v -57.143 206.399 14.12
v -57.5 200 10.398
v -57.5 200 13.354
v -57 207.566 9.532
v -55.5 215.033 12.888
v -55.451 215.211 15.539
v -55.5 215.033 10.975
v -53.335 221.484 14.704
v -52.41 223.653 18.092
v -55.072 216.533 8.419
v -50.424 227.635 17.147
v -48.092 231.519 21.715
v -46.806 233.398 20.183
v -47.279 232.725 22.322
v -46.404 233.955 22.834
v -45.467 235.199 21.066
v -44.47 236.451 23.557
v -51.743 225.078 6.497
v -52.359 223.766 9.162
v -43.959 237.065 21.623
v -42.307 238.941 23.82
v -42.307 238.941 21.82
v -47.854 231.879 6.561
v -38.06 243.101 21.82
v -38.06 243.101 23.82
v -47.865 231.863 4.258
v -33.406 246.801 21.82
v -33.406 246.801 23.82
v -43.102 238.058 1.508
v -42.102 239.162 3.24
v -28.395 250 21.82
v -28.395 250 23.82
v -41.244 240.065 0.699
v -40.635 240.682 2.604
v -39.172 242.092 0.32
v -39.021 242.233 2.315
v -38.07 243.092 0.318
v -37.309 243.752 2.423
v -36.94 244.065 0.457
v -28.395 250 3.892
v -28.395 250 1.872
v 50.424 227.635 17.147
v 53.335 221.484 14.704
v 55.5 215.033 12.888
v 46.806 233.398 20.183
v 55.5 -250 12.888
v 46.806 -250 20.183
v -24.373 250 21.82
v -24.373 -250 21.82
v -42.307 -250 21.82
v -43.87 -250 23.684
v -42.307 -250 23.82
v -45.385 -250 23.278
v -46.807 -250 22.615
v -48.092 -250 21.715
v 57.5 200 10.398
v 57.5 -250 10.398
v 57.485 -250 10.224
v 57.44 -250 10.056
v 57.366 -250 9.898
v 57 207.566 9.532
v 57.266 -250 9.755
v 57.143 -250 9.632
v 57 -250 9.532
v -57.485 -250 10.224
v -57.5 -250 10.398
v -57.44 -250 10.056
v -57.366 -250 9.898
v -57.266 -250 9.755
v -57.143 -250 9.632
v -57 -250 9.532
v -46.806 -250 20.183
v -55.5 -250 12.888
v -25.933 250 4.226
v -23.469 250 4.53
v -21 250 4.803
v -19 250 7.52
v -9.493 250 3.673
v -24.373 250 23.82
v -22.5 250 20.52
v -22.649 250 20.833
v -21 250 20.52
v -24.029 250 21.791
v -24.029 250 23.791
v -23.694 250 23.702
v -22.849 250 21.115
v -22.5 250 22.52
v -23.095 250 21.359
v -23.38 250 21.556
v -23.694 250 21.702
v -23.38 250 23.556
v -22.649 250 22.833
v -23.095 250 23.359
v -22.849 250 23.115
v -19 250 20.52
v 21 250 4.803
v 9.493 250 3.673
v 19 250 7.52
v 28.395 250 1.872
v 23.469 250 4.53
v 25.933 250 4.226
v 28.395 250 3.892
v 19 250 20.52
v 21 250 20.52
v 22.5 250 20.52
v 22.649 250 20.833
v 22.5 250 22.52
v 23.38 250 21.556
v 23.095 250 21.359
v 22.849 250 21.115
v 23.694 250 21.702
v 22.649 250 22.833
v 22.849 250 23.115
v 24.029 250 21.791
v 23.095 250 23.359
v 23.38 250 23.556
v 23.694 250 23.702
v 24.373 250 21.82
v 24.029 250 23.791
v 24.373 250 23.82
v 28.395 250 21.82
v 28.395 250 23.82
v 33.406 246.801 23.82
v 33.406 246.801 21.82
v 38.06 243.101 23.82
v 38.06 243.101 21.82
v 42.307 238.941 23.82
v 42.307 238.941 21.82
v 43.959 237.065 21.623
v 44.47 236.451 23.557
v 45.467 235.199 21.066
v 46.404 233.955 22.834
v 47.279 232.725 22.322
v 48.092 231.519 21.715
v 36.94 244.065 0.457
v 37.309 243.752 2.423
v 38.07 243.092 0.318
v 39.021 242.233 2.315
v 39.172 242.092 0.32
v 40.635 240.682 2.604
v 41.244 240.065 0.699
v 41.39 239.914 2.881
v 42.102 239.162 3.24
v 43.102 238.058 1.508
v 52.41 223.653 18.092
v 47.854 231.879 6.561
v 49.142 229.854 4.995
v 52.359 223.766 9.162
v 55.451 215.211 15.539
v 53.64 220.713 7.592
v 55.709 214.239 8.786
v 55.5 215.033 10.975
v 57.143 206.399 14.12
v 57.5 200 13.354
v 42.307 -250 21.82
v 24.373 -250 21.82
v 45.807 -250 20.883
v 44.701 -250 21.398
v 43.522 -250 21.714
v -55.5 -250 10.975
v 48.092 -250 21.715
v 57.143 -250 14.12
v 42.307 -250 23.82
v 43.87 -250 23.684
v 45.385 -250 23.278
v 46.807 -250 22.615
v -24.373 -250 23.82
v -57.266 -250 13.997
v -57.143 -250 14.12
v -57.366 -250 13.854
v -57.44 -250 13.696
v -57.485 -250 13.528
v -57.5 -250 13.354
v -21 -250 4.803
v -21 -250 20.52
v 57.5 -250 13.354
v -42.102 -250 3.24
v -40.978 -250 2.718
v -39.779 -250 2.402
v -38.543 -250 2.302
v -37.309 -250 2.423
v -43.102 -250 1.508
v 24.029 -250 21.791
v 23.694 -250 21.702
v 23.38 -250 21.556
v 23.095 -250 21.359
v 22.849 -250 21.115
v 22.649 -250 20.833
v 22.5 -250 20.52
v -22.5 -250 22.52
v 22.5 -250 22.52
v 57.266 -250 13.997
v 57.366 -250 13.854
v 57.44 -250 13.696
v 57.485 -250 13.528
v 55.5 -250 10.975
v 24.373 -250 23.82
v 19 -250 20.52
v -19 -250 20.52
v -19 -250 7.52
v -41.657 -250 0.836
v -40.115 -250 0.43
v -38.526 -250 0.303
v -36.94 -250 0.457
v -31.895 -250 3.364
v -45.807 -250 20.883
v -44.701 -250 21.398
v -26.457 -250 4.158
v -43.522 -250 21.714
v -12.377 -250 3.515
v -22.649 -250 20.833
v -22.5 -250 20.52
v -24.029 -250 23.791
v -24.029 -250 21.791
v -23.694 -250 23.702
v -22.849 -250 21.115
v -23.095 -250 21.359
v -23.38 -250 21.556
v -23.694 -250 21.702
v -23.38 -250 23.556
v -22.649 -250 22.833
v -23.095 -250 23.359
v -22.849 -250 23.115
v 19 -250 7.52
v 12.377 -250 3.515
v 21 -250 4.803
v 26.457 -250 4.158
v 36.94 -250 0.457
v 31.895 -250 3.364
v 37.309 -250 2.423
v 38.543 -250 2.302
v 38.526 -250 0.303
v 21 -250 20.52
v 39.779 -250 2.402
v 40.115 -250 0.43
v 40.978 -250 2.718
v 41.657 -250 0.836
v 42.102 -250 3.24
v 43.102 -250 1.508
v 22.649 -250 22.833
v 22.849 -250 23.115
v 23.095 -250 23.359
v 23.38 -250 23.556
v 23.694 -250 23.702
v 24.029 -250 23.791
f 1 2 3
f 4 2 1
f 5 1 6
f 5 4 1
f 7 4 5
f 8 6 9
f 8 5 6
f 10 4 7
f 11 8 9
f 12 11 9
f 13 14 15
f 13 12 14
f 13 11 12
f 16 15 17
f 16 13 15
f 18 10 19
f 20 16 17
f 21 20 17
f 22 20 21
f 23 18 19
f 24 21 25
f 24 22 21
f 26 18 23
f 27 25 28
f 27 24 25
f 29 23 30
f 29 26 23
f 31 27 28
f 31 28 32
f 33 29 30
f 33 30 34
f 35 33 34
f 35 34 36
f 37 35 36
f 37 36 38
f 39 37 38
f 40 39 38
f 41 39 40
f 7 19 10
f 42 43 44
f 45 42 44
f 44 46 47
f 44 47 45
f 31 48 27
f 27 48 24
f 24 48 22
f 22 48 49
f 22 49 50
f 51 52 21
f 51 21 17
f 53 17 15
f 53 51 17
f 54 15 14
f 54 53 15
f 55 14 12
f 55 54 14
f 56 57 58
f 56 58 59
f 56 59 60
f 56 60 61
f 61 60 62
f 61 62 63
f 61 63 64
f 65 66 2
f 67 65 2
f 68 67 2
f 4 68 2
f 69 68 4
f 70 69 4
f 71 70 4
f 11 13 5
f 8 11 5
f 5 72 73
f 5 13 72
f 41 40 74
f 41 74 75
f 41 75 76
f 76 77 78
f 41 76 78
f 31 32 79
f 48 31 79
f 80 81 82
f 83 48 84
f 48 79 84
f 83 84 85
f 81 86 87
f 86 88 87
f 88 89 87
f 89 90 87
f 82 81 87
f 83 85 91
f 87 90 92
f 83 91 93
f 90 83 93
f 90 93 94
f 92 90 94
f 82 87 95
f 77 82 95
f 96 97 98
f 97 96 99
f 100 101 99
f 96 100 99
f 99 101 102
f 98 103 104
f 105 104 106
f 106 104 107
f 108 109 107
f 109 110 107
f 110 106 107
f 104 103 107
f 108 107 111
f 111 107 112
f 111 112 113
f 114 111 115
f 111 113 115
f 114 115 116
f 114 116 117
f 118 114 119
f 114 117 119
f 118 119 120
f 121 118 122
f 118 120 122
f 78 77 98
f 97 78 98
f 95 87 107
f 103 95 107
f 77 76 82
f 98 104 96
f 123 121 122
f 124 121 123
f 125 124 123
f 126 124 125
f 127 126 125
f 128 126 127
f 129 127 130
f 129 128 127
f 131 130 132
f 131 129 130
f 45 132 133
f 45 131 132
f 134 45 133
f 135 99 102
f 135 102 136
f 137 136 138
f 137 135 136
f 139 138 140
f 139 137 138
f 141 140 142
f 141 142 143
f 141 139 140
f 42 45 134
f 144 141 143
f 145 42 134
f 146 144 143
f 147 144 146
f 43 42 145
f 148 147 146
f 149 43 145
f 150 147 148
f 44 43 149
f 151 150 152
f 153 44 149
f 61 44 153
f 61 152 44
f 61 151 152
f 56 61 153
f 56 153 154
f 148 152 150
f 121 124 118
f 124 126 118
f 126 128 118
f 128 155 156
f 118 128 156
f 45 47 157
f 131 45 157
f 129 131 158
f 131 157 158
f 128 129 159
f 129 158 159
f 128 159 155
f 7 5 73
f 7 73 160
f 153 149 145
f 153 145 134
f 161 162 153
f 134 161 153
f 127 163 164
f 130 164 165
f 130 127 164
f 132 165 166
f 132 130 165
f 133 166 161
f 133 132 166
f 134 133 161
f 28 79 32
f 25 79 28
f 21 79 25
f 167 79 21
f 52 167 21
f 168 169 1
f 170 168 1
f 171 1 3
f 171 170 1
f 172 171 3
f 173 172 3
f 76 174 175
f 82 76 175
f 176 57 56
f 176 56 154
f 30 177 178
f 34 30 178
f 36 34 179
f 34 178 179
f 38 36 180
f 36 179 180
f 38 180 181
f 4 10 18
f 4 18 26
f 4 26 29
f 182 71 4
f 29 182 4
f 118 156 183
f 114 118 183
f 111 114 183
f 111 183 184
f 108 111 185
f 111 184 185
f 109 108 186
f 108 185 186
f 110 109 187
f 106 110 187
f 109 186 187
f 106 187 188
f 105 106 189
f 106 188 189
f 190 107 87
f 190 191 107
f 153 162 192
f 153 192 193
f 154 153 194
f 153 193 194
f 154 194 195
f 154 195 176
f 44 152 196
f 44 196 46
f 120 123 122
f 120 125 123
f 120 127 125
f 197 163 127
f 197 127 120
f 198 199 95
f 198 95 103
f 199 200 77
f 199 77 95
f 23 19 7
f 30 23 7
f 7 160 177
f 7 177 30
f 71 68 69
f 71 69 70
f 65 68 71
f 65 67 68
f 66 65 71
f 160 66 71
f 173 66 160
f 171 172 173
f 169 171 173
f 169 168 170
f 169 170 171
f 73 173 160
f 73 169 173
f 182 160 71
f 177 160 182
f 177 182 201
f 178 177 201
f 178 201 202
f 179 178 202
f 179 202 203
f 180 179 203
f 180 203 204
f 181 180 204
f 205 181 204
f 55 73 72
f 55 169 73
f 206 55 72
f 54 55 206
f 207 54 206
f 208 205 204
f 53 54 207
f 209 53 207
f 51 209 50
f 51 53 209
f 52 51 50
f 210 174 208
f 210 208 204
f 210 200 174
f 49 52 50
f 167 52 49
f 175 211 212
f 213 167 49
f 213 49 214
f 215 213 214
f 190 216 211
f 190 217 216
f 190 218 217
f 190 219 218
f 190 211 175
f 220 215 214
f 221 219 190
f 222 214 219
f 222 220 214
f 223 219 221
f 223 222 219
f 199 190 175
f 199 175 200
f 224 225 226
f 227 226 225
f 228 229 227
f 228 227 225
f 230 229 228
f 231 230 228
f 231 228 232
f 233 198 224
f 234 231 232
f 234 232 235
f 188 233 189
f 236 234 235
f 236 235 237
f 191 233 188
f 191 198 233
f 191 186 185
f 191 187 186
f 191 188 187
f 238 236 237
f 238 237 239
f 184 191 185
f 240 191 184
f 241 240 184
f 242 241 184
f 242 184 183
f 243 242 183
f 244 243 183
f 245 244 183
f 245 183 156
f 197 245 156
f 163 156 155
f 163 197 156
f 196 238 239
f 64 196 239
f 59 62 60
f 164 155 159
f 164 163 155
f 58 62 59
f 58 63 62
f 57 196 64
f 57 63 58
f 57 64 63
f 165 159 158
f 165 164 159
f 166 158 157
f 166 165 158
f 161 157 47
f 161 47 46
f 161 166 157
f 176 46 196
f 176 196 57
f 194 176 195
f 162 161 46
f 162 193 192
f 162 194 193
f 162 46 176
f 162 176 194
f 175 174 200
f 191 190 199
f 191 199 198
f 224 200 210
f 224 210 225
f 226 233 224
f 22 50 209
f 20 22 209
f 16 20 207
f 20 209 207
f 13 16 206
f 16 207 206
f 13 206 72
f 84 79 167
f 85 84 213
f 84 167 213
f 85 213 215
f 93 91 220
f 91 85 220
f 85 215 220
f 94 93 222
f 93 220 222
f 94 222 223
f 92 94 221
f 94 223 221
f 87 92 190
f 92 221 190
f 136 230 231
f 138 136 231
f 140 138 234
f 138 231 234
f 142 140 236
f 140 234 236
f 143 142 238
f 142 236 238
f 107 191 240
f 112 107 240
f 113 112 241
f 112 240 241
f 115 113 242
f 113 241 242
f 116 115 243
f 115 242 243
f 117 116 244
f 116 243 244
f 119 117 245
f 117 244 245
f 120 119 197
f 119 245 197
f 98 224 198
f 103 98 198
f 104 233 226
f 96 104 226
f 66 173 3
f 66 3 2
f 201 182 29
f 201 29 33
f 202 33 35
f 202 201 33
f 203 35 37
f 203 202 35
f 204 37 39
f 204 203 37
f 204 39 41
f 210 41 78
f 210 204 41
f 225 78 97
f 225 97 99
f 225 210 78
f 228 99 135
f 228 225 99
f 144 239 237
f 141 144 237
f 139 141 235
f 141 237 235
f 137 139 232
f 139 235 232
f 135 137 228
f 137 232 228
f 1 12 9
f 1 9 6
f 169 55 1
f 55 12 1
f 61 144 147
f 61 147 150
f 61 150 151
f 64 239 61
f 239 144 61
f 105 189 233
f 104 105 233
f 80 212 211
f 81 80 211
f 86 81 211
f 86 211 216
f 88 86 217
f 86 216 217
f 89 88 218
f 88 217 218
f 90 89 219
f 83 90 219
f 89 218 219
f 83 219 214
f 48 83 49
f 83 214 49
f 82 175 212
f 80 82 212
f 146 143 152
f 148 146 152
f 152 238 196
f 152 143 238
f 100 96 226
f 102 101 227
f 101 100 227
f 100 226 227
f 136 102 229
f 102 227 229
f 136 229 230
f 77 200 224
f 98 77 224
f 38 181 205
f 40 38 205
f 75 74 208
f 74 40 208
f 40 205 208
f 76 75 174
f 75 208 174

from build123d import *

# Parameters (mm, degrees)
F1_DEPTH       = 250
F2_W           = 38
F2_H           = 13
F3_DEPTH       = 1200
F5_R           = 9
F6_R           = 1
F9_DEPTH       = 500.001
F11_DEPTH      = 23.8214951236
F11_DEPTH_BACK = 526


# Not quite as in the source:
# - an extrude ends at something that could not be found from the text; its depth is read off the source's solid
# - a feature of the source that left no trace in its solid (it failed there, or was rolled back) is left out


with BuildPart() as f1:
    # F0 (on Front) → F1 (new body, symmetric)
    with BuildSketch(Plane.XZ):
        with BuildLine():
            Line((22.5, 62.3204951236), (0, 62.3204951236))
            Line((0, 62.3204951236), (-22.5, 62.3204951236))
            Line((-22.5, 62.3204951236), (-22.5, 63.6204951236))
            Line((-22.5, 63.6204951236), (-45.5824640741, 63.6204951236))
            Line((-45.5824640741, 63.6204951236), (-57.5, 53.6204951236))
            Line((-57.5, 53.6204951236), (-57.5, 49.6204951236))
            Line((-57.5, 49.6204951236), (-40.1794919243, 39.6204951236))
            ThreePointArc((-40.1794919243, 39.6204951236), (0, 43.698039982), (40.1794919243, 39.6204951236))
            Line((40.1794919243, 39.6204951236), (57.5, 49.6204951236))
            Line((57.5, 49.6204951236), (57.5, 53.6204951236))
            Line((57.5, 53.6204951236), (45.5824640741, 63.6204951236))
            Line((45.5824640741, 63.6204951236), (22.5, 63.6204951236))
            Line((22.5, 63.6204951236), (22.5, 62.3204951236))
        make_face()
    extrude(amount=F1_DEPTH, both=True)

    # F2 (on face) → F3 (cut)
    with BuildSketch(Plane.XZ.offset(250)):
        with Locations((0, 53.8204951236)):
            Rectangle(F2_W, F2_H)
    extrude(amount=-F3_DEPTH, mode=Mode.SUBTRACT)

    # F5
    f5_edges = [f1.edges().sort_by_distance(p)[0] for p in [
        (45.582464, 0, 63.620495),
        (40.179492, 0, 39.620495),
        (-40.179492, 0, 39.620495),
        (-45.582464, 0, 63.620495),
    ]]
    fillet(f5_edges, radius=F5_R)

    # F6
    f6_edges = [f1.edges().sort_by_distance(p)[0] for p in [
        (-57.5, 0, 53.620495),
        (-57.5, 0, 49.620495),
        (57.5, 0, 53.620495),
        (57.5, 0, 49.620495),
    ]]
    fillet(f6_edges, radius=F6_R)


with BuildPart() as f1_1:
    # F7: moved
    add(f1.part.moved(Location((0, 0, -39.8))))

    # F8 (on face) → F9 (cut, through all)
    with BuildSketch(Plane.XZ.offset(250)):
        with BuildLine():
            ThreePointArc((22.5, 22.5204951236), (23.2333239744, 23.4636627961), (24.3734993995, 23.8204951236))
            Line((24.3734993995, 23.8204951236), (22.5, 23.8204951236))
            Line((22.5, 23.8204951236), (22.5, 22.5204951236))
        make_face()
        with BuildLine():
            ThreePointArc((-24.3734993995, 23.8204951236), (-23.2333239744, 23.4636627961), (-22.5, 22.5204951236))
            Line((-22.5, 22.5204951236), (-22.5, 23.8204951236))
            Line((-22.5, 23.8204951236), (-24.3734993995, 23.8204951236))
        make_face()
        with BuildLine():
            ThreePointArc((-42.1022690923, 3.2400121158), (-39.7790673433, 2.4018170628), (-37.3093701274, 2.4226251111))
            ThreePointArc((-37.3093701274, 2.4226251111), (-29.1789785809, 3.779472859), (-21, 4.8034903809))
            Line((-21, 4.8034903809), (-21, 20.5204952508))
            Line((-21, 20.5204952508), (-22.5, 20.5204952508))
            ThreePointArc((-22.5, 20.5204952508), (-23.2333240107, 21.4636628361), (-24.3734993995, 21.8204951236))
            Line((-24.3734993995, 21.8204951236), (-42.3067319657, 21.8204951236))
            ThreePointArc((-42.3067319657, 21.8204951236), (-44.7008729689, 21.3983434691), (-46.8062452335, 20.1828062254))
            Line((-46.8062452335, 20.1828062254), (-55.5, 12.8878798072))
            Line((-55.5, 12.8878798072), (-55.5, 10.9751956619))
            Line((-55.5, 10.9751956619), (-42.1022690923, 3.2400121158))
        make_face()
        with BuildLine():
            ThreePointArc((24.3734993995, 21.8204951236), (23.2333240107, 21.4636628361), (22.5, 20.5204952508))
            Line((22.5, 20.5204952508), (21, 20.5204952508))
            Line((21, 20.5204952508), (21, 4.8034903809))
            ThreePointArc((21, 4.8034903809), (29.1789785809, 3.779472859), (37.3093701274, 2.4226251111))
            ThreePointArc((37.3093701274, 2.4226251111), (39.7790673433, 2.4018170628), (42.1022690923, 3.2400121158))
            Line((42.1022690923, 3.2400121158), (55.5, 10.9751956619))
            Line((55.5, 10.9751956619), (55.5, 12.8878798072))
            Line((55.5, 12.8878798072), (46.8062452335, 20.1828062254))
            ThreePointArc((46.8062452335, 20.1828062254), (44.7008729689, 21.3983434691), (42.3067319657, 21.8204951236))
            Line((42.3067319657, 21.8204951236), (24.3734993995, 21.8204951236))
        make_face()
    extrude(amount=-F9_DEPTH, mode=Mode.SUBTRACT)

    # F10 (on Top) → F11 (cut, two sides)
    with BuildSketch(Plane.XY) as f11_sk:
        with BuildLine():
            ThreePointArc((-57.5, 200), (0, 257.5), (57.5, 200))
            Line((57.5, 200), (57.5, 280))
            Line((57.5, 280), (-57.5, 280))
            Line((-57.5, 280), (-57.5, 200))
        make_face()
    extrude(amount=F11_DEPTH, mode=Mode.SUBTRACT)
    extrude(f11_sk.sketch, amount=-F11_DEPTH_BACK, mode=Mode.SUBTRACT)


solid = f1_1.part
